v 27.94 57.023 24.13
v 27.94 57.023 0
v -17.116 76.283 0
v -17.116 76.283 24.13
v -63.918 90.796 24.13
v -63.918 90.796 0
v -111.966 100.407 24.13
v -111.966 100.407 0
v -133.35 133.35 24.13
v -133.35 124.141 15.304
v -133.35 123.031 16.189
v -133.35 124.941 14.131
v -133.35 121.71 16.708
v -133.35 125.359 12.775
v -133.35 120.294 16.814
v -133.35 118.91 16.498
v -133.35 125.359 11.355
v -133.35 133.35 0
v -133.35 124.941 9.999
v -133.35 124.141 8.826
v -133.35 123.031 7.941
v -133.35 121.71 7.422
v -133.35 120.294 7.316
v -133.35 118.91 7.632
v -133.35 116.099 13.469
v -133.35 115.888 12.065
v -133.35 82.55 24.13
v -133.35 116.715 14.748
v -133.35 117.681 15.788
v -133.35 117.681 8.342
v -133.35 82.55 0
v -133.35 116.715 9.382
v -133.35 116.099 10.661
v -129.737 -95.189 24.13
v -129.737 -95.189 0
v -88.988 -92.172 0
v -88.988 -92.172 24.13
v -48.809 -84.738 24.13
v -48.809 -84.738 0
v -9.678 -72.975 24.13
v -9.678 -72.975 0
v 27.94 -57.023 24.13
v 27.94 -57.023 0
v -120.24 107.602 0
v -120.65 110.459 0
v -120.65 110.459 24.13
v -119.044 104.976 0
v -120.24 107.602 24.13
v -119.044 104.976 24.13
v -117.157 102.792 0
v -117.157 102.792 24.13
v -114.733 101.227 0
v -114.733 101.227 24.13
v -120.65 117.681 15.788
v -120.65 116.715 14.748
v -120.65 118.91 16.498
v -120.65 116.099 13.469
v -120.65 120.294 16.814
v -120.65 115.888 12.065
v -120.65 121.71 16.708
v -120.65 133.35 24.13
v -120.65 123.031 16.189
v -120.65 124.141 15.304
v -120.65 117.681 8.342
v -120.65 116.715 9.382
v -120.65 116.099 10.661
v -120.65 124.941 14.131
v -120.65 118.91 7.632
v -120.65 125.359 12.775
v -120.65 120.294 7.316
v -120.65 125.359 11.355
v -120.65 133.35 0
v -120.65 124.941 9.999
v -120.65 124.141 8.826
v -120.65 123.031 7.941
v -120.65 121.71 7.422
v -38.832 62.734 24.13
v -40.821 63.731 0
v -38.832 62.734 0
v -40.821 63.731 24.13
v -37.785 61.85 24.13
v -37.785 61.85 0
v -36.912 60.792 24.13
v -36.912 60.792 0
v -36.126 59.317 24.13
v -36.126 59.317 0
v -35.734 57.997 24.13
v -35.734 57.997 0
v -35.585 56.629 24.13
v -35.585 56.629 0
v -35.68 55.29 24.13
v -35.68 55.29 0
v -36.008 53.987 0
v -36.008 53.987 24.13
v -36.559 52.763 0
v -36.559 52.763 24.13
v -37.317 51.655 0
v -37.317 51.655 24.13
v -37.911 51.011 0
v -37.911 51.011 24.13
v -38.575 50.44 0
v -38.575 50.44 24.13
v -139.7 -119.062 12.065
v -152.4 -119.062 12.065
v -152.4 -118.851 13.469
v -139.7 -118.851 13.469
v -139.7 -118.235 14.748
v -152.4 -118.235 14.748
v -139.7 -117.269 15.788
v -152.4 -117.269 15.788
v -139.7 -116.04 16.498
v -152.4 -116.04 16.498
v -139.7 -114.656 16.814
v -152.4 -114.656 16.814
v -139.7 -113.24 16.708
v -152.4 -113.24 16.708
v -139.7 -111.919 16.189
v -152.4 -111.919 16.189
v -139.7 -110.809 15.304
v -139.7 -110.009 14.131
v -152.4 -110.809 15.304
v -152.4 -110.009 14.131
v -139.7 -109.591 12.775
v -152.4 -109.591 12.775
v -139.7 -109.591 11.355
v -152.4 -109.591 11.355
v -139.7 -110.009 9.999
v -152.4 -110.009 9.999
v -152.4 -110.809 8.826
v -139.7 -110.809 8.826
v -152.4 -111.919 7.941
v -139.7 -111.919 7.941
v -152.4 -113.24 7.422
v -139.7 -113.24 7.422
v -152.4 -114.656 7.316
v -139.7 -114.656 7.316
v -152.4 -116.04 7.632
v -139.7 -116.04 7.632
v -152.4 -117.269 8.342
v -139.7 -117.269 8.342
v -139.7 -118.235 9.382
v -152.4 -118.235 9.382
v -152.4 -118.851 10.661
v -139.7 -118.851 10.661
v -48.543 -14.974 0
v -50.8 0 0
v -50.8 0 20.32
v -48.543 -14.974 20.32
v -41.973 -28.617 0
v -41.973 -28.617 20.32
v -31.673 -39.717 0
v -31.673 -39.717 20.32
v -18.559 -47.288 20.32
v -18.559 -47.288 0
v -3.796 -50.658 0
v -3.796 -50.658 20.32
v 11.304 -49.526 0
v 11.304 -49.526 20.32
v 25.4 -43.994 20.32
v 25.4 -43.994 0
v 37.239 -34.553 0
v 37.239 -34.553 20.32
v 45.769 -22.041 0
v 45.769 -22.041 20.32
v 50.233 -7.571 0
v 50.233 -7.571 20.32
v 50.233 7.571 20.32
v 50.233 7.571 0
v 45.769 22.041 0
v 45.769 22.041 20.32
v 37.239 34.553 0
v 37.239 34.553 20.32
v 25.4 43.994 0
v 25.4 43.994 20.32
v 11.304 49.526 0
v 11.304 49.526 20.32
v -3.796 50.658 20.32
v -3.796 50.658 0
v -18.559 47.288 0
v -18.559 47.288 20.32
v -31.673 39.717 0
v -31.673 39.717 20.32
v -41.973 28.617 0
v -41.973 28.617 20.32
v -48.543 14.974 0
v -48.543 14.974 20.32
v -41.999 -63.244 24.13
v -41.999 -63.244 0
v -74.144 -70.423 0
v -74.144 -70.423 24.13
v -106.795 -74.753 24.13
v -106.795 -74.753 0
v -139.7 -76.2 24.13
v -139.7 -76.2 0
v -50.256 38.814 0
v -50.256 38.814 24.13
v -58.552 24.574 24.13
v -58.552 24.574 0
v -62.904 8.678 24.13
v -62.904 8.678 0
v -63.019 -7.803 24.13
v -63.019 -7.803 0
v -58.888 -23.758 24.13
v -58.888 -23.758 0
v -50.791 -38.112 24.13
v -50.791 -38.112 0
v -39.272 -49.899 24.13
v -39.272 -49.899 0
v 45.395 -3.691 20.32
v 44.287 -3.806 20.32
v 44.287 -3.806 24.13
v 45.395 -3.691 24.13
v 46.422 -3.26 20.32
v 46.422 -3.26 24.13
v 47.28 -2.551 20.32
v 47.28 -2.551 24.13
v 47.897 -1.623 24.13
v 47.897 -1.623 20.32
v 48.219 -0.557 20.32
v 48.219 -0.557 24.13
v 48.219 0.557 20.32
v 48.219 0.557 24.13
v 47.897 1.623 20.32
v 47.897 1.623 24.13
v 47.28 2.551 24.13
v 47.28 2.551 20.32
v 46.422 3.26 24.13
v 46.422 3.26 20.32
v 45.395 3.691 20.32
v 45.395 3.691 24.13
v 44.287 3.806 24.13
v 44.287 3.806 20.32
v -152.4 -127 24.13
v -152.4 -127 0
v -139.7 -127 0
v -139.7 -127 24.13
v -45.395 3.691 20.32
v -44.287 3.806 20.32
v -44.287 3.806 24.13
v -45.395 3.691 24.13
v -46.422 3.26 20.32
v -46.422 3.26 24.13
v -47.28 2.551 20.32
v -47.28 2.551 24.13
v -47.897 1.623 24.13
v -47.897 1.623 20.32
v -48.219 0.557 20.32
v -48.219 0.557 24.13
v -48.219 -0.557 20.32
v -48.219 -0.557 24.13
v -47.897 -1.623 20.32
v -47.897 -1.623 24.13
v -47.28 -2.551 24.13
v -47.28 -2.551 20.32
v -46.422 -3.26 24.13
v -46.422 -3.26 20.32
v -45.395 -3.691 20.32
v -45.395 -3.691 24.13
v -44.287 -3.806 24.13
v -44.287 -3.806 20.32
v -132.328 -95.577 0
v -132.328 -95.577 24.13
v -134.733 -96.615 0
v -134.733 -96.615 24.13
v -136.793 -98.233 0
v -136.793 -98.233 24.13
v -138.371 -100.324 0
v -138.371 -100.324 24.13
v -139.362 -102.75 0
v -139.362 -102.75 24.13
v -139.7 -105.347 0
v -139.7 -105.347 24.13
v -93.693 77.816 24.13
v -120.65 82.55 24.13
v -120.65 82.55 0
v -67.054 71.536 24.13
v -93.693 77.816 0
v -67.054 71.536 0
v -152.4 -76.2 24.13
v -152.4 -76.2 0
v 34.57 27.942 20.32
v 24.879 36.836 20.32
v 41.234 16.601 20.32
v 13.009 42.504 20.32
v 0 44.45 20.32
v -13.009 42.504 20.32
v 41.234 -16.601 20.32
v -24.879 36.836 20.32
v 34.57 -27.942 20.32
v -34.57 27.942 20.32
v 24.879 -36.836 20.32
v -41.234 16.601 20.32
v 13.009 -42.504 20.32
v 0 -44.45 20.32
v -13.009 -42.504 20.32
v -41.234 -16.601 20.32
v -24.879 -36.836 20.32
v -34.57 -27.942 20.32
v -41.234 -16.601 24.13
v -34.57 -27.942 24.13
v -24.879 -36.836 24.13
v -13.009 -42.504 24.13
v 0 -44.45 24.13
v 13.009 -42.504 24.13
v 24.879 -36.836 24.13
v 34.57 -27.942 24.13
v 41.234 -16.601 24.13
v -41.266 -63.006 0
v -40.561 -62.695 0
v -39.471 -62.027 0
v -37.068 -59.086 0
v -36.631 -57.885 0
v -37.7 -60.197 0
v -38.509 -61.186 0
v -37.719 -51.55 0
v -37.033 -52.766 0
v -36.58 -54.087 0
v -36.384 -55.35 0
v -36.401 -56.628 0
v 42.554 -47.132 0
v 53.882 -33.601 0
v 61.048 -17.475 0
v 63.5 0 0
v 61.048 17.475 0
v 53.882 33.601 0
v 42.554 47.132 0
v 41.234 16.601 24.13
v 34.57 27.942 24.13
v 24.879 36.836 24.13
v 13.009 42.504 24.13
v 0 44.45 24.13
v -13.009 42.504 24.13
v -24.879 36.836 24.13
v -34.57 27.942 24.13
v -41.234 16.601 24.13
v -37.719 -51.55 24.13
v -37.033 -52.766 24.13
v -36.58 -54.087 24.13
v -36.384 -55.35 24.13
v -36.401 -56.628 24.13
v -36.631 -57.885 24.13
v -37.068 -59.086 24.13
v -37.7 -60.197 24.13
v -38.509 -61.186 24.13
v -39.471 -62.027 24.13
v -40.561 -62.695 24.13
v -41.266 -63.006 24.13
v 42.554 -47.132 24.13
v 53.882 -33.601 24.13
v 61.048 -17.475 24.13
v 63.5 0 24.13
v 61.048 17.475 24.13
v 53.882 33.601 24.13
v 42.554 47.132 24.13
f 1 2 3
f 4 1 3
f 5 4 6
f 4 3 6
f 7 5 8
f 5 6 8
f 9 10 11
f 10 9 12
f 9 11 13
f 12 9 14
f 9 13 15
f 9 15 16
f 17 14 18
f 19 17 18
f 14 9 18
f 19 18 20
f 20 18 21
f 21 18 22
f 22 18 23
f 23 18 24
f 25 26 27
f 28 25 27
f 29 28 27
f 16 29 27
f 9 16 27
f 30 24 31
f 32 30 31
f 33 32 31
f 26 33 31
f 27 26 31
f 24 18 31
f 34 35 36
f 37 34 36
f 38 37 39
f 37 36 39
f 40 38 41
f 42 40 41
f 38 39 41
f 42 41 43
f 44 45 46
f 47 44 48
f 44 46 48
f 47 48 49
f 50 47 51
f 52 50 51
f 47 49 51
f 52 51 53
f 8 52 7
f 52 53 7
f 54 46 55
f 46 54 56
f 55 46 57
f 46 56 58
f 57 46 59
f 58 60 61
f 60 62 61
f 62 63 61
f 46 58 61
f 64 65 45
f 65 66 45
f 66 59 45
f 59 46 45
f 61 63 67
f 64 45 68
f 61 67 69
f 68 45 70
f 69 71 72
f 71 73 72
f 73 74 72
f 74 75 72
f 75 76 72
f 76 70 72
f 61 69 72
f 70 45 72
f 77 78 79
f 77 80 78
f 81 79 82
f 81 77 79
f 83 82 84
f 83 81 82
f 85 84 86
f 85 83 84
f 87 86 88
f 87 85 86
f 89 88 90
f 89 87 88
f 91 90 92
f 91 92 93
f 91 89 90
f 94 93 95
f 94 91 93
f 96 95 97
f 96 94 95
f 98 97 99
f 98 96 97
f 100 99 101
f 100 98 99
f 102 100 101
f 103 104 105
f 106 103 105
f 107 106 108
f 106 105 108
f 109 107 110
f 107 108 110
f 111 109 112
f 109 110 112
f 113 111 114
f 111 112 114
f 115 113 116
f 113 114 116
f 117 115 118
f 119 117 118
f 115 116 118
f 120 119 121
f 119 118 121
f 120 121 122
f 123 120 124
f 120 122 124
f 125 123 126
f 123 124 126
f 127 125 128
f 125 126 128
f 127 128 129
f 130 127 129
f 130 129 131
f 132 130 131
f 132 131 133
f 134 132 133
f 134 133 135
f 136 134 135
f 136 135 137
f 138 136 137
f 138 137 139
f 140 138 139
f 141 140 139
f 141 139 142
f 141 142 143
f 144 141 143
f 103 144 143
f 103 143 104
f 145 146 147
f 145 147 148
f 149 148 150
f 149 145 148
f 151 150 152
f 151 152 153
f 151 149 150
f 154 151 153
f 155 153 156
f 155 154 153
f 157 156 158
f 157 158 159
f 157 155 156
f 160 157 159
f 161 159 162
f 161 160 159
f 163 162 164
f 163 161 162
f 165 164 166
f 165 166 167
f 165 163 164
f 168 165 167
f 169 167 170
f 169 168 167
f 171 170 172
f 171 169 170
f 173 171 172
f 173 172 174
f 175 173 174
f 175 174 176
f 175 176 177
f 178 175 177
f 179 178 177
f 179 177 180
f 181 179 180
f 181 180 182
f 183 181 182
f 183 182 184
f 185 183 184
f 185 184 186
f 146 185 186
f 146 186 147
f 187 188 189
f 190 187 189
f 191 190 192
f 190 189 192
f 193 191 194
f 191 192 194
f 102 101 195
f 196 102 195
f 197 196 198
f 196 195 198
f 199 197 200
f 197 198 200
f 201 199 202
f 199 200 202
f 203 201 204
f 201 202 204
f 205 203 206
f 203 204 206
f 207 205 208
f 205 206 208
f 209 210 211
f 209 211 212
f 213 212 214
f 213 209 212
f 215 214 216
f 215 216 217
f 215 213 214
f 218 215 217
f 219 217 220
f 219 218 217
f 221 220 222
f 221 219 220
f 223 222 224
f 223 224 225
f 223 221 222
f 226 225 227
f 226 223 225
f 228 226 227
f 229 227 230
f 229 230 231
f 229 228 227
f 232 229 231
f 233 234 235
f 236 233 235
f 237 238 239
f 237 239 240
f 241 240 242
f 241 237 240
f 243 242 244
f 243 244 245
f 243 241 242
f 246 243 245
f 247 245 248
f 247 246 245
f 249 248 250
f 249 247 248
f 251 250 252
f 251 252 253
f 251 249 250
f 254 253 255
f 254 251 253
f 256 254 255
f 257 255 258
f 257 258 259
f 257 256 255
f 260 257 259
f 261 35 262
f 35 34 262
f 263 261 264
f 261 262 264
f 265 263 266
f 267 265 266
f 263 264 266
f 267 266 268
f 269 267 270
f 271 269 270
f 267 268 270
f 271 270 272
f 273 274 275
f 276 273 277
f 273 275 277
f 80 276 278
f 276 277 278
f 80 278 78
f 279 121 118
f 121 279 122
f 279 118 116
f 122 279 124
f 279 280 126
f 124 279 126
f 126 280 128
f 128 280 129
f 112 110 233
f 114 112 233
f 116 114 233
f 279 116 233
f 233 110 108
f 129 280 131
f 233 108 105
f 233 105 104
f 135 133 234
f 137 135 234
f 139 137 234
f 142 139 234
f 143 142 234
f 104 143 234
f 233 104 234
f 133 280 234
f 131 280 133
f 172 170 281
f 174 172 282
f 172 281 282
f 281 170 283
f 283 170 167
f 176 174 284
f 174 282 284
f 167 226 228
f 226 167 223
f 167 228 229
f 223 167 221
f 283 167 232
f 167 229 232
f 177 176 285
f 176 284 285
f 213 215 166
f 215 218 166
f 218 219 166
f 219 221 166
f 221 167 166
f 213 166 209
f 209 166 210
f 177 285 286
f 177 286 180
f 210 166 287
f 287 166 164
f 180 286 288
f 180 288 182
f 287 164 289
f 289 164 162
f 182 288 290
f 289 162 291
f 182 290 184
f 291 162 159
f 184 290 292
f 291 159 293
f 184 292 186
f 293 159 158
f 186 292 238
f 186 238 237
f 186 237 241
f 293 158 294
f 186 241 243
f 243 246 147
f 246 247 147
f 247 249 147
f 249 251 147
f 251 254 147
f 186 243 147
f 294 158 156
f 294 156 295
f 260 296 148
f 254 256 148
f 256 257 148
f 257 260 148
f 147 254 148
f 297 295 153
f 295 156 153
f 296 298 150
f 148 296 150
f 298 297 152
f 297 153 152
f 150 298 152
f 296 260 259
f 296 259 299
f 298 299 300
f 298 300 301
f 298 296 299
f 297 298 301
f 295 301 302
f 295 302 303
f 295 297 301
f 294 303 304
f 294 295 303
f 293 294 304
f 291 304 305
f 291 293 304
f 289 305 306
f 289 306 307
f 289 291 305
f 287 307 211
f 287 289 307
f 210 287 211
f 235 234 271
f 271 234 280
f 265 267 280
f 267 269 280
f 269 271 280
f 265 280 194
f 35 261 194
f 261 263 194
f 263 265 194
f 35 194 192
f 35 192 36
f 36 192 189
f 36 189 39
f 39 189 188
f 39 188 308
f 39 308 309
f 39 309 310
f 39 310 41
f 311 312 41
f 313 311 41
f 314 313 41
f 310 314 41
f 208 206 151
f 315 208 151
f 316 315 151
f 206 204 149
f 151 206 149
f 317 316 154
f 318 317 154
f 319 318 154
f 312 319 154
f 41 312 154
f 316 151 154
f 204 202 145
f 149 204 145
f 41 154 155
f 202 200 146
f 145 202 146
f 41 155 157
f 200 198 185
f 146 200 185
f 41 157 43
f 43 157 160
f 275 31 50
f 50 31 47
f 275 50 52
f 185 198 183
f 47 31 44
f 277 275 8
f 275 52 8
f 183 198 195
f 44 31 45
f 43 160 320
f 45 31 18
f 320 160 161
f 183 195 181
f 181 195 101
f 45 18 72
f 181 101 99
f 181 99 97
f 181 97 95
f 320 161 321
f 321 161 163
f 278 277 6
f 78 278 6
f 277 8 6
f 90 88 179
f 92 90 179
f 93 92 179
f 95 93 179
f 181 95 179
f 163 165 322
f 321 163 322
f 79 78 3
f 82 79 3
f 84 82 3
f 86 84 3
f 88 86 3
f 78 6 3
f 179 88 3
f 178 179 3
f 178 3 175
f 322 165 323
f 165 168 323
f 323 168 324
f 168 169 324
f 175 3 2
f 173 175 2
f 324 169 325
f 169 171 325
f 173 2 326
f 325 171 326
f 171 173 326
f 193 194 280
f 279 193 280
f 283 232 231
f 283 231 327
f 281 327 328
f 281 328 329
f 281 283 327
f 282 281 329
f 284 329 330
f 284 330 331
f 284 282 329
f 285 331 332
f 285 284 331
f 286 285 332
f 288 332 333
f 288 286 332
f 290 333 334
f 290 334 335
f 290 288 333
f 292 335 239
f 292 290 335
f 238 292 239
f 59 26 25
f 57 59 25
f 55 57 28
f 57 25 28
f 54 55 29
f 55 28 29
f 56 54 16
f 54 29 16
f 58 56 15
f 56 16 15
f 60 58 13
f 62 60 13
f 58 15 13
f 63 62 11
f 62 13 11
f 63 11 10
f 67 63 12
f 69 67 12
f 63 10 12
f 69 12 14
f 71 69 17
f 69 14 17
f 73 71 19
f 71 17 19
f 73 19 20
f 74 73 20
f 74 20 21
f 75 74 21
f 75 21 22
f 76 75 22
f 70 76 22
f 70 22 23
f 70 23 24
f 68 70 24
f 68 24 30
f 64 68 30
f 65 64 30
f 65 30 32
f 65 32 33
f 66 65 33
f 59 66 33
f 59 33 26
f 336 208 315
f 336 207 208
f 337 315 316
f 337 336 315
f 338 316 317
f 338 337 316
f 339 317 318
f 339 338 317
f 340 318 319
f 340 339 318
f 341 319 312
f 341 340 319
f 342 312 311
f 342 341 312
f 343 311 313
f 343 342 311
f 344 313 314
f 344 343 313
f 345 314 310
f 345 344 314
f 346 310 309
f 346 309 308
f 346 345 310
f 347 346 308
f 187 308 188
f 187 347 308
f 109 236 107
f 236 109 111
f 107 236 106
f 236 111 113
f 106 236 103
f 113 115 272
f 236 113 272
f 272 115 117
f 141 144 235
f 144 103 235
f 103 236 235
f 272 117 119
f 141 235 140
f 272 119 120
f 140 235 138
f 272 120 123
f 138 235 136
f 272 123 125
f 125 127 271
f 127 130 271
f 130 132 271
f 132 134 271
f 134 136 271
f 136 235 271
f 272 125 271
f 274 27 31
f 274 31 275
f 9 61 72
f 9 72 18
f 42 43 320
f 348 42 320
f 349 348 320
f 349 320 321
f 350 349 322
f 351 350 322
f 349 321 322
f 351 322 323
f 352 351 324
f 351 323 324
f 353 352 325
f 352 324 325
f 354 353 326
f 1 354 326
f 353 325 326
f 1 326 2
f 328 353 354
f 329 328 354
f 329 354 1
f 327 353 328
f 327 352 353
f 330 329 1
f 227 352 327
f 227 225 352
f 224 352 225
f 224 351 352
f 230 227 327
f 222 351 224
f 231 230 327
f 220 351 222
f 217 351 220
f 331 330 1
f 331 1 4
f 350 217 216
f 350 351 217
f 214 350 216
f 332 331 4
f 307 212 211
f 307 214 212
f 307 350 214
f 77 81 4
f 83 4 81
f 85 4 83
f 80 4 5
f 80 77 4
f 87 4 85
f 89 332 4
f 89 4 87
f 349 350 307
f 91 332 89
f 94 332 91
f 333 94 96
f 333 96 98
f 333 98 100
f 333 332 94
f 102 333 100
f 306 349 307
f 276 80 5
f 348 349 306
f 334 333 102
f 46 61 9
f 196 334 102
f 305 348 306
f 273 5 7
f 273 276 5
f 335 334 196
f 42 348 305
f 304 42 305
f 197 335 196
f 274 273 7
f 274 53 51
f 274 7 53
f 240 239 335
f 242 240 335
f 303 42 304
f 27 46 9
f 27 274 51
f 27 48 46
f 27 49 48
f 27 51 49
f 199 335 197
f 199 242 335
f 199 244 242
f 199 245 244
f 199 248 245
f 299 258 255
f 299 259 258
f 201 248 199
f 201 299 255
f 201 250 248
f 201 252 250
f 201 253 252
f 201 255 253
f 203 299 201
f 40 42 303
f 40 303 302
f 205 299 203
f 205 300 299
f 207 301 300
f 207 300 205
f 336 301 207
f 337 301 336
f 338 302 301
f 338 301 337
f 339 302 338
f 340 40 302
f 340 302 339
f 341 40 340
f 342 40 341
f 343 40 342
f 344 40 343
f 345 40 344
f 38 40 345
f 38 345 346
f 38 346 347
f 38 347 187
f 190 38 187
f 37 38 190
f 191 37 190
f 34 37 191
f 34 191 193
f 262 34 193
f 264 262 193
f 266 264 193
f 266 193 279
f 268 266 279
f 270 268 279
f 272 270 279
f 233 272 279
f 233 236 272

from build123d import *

# Parameters (mm, degrees)
SKETCH1_R           = 50.8
BOSS_EXTRUDE1_DEPTH = 24.13
FILLET1_R           = 10.16
FILLET3_R           = 7.62
SKETCH2_R           = 4.7625
CUT_EXTRUDE1_DEPTH  = 255.906432784
BOSS_EXTRUDE2_START = -3.81
SKETCH3_R           = 50.8
BOSS_EXTRUDE2_DEPTH = 3.81


with BuildPart() as part:
    # Sketch1 → Boss-Extrude1 (new body)
    with BuildSketch(Plane.XY):
        with BuildLine():
            Line((-133.35, 133.35), (-133.35, 82.55))
            Line((-133.35, 82.55), (-120.65, 82.55))
            ThreePointArc((-120.65, 82.55), (-72.294267859, 72.899793875), (-25.200511476, 58.285368844))
            ThreePointArc((-25.200511476, 58.285368844), (-63.5, 0), (-25.200511476, -58.285368844))
            ThreePointArc((-25.200511476, -58.285368844), (-81.753760084, -71.69426344), (-139.7, -76.2))
            Line((-139.7, -76.2), (-152.4, -76.2))
            Line((-152.4, -76.2), (-152.4, -127))
            Line((-152.4, -127), (-139.7, -127))
            Line((-139.7, -127), (-139.7, -95.25))
            ThreePointArc((-139.7, -95.25), (-53.65862904, -85.877953603), (27.94, -57.022858574))
            ThreePointArc((27.94, -57.022858574), (63.5, 0), (27.94, 57.022858574))
            ThreePointArc((27.94, 57.022858574), (-44.521647721, 85.422584161), (-120.65, 101.6))
            Line((-120.65, 101.6), (-120.65, 133.35))
            Line((-120.65, 133.35), (-133.35, 133.35))
        make_face()
        with Locations(Location((0, 0, 0), (0, 0, 180))):
            Circle(SKETCH1_R, mode=Mode.SUBTRACT)
    extrude(amount=BOSS_EXTRUDE1_DEPTH)

    # Fillet1
    fillet1_edges = [part.edges().sort_by_distance(p)[0] for p in [
        (-120.65, 101.6, 12.065),
        (-139.7, -95.25, 12.065),
    ]]
    fillet(fillet1_edges, radius=FILLET1_R)

    # Fillet3
    fillet3_edges = [part.edges().sort_by_distance(p)[0] for p in [
        (-25.200511476, -58.285368844, 12.065),
        (-25.200511476, 58.285368844, 12.065),
    ]]
    fillet(fillet3_edges, radius=FILLET3_R)

    # Sketch2 → Cut-Extrude1 (cut, through all)
    with BuildSketch(Plane.ZY.offset(152.4)):
        with Locations(Location((12.065, -114.3, 0), (0, 0, 270))):
            Circle(SKETCH2_R)
        with Locations(Location((12.065, 120.65, 0), (0, 0, 270))):
            Circle(SKETCH2_R)
    extrude(amount=-CUT_EXTRUDE1_DEPTH, mode=Mode.SUBTRACT)

    # Sketch3 → Boss-Extrude2 (add)
    with BuildSketch(Plane.XY.offset(24.13).offset(BOSS_EXTRUDE2_START)):
        with Locations(Location((0, 0, 0), (0, 0, 180))):
            Circle(SKETCH3_R)
        with BuildLine():
            ThreePointArc((-44.286714286, -3.806499412), (0, -44.45), (44.286714286, -3.806499412))
            ThreePointArc((44.286714286, -3.806499412), (48.26, 0), (44.286714286, 3.806499412))
            ThreePointArc((44.286714286, 3.806499412), (0, 44.45), (-44.286714286, 3.806499412))
            ThreePointArc((-44.286714286, 3.806499412), (-48.26, 0), (-44.286714286, -3.806499412))
        make_face(mode=Mode.SUBTRACT)
    extrude(amount=BOSS_EXTRUDE2_DEPTH)


solid = part.part
